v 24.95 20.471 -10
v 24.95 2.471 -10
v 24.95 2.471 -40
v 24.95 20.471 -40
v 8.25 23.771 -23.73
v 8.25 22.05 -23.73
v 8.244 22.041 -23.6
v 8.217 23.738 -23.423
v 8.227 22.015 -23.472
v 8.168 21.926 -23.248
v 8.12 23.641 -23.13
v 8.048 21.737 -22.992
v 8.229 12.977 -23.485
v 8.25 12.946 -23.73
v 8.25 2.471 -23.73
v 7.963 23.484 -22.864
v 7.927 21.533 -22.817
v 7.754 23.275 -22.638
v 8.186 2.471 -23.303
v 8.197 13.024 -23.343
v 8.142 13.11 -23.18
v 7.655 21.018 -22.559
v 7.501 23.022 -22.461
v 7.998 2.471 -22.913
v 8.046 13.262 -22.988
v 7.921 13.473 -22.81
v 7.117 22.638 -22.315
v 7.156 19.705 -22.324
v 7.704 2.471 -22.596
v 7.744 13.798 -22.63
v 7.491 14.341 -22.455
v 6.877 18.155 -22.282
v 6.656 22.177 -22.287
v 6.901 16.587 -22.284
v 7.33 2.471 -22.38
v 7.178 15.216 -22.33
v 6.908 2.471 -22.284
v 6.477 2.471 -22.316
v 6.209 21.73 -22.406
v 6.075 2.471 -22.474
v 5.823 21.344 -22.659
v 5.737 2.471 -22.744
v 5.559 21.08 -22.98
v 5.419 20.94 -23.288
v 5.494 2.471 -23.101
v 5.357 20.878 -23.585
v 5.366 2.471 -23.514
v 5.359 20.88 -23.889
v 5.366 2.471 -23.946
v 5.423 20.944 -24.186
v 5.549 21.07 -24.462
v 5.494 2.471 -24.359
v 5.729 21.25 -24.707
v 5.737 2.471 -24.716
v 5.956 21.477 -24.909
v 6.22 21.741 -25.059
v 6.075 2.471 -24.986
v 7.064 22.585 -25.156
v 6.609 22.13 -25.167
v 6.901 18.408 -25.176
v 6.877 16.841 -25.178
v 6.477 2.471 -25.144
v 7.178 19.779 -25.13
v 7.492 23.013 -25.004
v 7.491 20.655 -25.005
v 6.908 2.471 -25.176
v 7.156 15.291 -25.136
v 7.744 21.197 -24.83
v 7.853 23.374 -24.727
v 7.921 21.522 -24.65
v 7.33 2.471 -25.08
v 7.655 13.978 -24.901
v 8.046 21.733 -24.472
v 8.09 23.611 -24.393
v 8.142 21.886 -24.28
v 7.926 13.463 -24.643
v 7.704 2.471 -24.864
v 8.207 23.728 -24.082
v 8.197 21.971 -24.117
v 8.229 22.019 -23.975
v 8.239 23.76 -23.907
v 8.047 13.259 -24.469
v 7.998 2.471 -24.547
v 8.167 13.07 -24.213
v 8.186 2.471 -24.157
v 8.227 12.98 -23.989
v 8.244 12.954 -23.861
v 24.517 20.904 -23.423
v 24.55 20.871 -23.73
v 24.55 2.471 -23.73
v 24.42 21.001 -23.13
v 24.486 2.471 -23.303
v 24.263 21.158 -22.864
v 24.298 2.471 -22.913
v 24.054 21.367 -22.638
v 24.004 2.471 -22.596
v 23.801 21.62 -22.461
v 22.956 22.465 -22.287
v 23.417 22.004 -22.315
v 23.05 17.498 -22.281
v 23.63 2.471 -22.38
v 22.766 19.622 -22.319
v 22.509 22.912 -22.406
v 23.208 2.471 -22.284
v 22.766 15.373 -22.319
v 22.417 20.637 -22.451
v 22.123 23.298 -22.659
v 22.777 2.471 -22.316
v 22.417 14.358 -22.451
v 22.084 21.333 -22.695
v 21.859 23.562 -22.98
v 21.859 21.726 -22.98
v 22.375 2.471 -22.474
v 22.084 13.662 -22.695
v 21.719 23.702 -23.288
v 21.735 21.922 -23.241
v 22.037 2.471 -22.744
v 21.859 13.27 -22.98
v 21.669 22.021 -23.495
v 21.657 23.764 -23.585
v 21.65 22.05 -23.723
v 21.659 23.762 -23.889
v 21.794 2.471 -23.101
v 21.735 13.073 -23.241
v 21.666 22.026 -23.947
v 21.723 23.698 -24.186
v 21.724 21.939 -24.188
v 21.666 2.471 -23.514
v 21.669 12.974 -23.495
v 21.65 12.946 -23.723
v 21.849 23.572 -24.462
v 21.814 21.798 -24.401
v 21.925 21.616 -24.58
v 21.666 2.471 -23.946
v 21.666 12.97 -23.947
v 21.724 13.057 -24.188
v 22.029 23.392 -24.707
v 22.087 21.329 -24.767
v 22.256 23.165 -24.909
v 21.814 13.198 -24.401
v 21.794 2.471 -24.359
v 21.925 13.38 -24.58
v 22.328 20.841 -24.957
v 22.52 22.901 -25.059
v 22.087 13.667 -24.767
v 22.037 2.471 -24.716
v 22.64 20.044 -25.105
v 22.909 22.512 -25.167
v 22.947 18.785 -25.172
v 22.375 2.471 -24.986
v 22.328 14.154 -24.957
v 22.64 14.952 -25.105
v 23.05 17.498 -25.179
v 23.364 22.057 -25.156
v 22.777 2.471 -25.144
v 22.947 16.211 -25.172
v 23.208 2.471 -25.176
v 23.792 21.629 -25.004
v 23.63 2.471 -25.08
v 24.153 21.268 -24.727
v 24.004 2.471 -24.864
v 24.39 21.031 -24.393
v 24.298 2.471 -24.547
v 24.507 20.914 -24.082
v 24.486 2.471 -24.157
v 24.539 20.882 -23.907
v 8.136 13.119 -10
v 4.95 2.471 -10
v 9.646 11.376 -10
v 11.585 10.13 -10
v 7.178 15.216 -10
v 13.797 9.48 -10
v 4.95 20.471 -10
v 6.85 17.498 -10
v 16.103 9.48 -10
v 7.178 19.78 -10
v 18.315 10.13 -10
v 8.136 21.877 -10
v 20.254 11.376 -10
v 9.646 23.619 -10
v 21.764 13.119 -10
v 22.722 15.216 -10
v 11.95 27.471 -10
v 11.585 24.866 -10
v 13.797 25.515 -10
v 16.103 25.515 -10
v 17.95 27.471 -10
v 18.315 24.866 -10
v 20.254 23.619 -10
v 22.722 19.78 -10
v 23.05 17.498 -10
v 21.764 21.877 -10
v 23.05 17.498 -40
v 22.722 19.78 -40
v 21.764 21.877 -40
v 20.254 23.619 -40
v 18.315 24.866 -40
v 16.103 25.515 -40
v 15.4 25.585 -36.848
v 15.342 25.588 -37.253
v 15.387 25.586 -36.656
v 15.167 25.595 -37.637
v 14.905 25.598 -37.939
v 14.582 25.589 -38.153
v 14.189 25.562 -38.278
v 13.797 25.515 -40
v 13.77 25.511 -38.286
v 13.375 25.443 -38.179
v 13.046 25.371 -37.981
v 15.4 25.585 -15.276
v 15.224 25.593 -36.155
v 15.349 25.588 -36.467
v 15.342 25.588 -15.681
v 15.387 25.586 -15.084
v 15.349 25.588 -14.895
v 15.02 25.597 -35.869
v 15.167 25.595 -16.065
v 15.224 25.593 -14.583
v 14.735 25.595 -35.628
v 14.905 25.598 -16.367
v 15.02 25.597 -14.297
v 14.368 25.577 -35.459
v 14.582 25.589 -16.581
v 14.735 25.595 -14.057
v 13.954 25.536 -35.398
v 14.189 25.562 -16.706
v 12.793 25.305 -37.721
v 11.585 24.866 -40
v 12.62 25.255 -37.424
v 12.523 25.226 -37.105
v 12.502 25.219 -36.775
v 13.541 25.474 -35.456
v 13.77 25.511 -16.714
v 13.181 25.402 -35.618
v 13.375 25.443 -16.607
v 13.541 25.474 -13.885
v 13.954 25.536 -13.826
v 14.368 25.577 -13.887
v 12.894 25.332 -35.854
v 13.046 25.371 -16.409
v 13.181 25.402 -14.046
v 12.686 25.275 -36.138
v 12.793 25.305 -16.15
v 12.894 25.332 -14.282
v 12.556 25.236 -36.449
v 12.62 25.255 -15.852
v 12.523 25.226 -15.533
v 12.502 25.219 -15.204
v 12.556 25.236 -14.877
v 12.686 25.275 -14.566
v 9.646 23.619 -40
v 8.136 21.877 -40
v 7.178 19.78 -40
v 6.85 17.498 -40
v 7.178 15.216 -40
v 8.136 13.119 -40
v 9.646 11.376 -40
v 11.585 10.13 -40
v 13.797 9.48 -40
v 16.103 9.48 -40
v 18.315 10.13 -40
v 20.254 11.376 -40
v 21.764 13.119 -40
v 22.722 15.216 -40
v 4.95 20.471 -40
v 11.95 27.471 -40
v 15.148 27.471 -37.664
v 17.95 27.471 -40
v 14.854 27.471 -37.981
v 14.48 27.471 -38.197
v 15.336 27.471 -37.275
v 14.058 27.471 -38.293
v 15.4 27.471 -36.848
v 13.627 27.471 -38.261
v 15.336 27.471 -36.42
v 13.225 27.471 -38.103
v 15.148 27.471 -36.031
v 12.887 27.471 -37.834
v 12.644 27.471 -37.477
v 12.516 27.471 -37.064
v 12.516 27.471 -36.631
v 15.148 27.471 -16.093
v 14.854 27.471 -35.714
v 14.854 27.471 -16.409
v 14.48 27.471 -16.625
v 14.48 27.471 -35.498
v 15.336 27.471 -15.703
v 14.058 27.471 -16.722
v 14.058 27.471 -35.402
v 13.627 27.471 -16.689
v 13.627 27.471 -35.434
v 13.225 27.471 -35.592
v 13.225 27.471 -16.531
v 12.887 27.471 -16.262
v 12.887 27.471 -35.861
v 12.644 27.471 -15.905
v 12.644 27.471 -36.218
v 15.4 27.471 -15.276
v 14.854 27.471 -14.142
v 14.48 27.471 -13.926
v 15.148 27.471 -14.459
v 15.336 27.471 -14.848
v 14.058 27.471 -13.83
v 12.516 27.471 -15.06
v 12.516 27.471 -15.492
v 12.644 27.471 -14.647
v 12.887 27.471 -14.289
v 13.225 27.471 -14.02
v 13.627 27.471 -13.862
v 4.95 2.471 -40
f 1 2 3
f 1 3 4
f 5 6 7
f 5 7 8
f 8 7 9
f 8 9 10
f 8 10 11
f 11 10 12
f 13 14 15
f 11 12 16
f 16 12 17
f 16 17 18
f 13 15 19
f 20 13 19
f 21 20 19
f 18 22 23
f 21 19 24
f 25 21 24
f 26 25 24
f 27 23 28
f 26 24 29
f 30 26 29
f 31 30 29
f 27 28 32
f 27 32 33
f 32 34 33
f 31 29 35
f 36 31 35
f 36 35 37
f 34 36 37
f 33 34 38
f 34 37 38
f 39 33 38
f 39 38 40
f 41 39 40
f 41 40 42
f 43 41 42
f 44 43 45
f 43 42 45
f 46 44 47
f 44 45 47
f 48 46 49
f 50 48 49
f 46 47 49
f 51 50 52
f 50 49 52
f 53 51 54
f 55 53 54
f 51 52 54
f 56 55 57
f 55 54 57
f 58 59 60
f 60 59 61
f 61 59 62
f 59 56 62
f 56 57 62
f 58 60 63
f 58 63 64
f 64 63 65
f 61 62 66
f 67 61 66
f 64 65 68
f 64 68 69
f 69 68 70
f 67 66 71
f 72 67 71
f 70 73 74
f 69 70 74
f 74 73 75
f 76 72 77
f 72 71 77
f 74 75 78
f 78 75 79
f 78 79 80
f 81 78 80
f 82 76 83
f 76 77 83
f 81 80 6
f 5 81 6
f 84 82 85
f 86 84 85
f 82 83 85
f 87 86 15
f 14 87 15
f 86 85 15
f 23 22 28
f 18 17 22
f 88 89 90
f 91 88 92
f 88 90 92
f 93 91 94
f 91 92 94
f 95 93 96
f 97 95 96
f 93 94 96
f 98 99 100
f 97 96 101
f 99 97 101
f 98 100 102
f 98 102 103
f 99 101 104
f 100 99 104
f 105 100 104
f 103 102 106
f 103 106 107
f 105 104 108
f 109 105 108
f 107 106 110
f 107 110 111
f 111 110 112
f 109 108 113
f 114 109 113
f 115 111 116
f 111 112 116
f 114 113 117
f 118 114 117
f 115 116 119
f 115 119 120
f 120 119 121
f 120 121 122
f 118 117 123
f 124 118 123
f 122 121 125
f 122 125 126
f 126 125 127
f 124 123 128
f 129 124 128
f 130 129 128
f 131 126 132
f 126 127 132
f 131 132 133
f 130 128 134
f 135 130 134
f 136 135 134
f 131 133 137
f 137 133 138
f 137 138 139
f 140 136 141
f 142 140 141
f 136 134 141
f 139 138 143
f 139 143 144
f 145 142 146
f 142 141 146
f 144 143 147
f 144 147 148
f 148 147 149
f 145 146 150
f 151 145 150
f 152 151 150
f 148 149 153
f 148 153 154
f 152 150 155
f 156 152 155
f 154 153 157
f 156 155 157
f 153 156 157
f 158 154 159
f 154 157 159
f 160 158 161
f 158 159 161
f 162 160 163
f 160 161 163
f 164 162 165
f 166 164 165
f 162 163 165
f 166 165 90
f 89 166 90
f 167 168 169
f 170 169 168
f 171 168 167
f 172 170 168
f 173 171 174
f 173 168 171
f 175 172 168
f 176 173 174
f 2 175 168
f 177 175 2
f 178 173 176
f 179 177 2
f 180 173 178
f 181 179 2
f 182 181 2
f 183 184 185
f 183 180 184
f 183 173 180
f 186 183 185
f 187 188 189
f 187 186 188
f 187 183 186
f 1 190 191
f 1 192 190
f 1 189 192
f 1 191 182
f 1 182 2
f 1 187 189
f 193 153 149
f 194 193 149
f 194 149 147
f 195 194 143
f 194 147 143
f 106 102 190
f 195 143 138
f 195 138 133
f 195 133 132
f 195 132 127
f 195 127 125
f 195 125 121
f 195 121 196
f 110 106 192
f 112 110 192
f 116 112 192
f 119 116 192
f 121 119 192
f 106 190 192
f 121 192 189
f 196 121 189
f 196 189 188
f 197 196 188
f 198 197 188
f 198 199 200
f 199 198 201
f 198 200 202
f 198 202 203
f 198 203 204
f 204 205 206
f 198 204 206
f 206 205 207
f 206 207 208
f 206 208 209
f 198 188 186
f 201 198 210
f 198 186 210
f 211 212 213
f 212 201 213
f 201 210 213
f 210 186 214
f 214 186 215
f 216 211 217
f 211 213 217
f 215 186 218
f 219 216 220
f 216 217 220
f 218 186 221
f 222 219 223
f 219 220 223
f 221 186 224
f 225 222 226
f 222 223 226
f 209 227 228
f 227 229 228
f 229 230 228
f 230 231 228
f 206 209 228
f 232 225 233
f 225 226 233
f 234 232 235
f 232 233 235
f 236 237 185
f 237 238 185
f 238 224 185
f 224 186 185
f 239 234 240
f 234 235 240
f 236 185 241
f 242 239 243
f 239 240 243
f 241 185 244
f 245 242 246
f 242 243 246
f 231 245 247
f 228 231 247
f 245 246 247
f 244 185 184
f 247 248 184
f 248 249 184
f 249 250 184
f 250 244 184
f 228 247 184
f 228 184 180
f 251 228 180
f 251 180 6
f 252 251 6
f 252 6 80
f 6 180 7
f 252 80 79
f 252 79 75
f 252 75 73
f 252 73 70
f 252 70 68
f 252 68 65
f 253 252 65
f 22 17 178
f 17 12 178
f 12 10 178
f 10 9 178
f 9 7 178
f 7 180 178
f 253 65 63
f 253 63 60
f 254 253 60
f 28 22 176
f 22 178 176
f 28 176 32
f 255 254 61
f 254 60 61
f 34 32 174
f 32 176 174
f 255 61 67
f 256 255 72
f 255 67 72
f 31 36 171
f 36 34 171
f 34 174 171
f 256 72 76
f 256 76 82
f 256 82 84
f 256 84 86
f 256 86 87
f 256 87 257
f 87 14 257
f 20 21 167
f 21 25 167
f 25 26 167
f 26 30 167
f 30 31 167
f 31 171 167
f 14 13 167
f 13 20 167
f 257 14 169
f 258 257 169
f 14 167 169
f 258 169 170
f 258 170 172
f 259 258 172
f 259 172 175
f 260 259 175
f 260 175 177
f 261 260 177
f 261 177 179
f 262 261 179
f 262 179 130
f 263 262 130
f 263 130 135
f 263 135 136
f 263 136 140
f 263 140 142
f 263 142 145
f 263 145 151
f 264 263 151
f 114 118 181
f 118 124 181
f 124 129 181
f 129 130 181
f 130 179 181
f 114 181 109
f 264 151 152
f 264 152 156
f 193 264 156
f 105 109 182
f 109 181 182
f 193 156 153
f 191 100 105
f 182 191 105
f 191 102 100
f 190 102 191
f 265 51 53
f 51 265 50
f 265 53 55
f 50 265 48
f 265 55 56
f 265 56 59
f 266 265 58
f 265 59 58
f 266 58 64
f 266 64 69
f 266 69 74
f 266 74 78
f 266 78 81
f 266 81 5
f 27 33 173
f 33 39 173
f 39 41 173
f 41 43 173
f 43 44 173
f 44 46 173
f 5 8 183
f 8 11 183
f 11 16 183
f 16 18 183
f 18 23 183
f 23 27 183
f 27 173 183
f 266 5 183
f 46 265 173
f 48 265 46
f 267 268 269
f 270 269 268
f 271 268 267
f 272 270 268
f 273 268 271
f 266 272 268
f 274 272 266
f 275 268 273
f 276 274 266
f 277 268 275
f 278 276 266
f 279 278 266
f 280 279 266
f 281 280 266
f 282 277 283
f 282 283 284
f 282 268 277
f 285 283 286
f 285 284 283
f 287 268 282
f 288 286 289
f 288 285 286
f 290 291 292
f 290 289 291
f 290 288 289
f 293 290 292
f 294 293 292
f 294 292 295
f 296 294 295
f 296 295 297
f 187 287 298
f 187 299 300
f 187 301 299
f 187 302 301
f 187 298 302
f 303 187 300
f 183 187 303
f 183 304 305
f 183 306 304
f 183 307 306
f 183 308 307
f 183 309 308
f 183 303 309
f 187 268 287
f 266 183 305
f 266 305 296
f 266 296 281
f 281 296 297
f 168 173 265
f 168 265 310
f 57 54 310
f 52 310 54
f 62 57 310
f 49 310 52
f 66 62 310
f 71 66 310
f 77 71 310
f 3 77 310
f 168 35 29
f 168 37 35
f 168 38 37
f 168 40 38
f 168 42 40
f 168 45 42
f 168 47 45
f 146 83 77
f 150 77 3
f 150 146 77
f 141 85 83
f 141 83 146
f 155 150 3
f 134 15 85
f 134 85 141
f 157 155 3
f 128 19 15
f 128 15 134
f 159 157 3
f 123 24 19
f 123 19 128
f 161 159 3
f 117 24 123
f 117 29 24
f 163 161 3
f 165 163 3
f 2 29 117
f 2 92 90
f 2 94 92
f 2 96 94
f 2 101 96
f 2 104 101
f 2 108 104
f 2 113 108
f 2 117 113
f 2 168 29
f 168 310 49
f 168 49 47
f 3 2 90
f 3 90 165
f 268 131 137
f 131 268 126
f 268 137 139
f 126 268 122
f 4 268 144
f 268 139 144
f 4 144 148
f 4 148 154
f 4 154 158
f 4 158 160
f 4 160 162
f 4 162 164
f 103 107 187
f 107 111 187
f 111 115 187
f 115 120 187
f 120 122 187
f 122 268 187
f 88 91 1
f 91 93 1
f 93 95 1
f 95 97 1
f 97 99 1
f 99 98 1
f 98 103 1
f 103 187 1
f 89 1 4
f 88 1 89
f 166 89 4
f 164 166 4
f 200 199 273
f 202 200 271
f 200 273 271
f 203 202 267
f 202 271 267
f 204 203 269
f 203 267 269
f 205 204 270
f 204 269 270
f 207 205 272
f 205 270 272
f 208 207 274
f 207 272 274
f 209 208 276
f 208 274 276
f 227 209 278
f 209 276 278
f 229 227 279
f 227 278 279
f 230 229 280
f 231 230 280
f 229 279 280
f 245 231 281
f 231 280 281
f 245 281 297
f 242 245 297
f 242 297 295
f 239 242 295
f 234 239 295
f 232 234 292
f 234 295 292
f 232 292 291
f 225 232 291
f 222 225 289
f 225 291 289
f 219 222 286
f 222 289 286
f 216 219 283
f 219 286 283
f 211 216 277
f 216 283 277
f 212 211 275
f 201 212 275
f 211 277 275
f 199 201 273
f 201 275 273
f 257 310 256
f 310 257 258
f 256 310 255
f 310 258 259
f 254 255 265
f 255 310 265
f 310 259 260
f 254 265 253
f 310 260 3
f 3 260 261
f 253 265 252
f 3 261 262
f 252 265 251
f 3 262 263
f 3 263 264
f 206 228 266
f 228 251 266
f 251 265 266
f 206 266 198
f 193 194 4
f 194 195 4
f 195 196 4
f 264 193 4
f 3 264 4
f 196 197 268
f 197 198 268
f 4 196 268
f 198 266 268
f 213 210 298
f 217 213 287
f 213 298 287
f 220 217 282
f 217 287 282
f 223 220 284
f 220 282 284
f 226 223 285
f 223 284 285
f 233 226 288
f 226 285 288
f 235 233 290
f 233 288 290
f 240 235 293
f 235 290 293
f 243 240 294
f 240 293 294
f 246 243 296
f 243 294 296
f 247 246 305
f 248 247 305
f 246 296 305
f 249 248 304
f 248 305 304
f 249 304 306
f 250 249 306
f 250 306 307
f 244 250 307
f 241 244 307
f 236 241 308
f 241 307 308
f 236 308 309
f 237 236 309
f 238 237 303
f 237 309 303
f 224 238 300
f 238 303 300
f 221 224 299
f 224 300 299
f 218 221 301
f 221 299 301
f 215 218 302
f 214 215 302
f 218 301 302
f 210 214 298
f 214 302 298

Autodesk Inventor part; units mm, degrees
ref_plane "YZ Plane" through (0, 0, 0) normal (1, 0, 0) x (0, 1, 0)
ref_plane "XZ Plane" through (0, 0, 0) normal (0, 1, 0) x (-1, 0, 0)
ref_plane "XY Plane" through (0, 0, 0) normal (0, 0, 1) x (1, 0, 0)
ref_plane "Work Plane1" through (0, 0, 0) normal (0, 0, 1) x (1, 0, 0)
ref_plane "Work Plane2" through (0, 0, -10) normal (0, 0, 1) x (1, 0, 0)
sketch "Sketch1" plane through (0, 0, -10) normal (0, 0, 1) x (1, 0, 0)
  circle A0 centre (14.95, 17.4977) radius 7.15 projected
  line L0 (0, 2.471) -> (29.9, 2.471) projected
  line L1 (0, 2.471) -> (0, 18.471) projected
  line L2 (0, 18.471) -> (-2, 18.471) projected
  line L3 (-2, 18.471) -> (-2, -1.5) projected
  line L4 (29.9, -1.5) -> (-2, -1.5) projected
  line L5 (29.9, -1.5) -> (29.9, 2.471) projected
  line L6 (4.95, 2.471) -> (24.95, 2.471)
  line L7 (24.95, 2.471) -> (24.95, 27.471)
  line L8 (24.95, 27.471) -> (4.95, 27.471)
  line L9 (4.95, 27.471) -> (4.95, 2.471)
  circle A1 centre (14.95, 17.4977) radius 8.1
  point P0 (0, 0)
  dimension "d6" = 20
  dimension "d7" = 25
  dimension "d8" = 10
  dimension "d23" = 16.2
extrude "Extrusion1" add sketch "Sketch1" against normal blind 30 contours L9 L8 L7 L0
sketch "Sketch2" plane through (4.95, 2.471, -10) normal (0, -1, 0) x (1, 0, 0)
  circle A0 centre (18.15, -13.73) radius 2.45 projected
  circle A1 centre (1.85, -13.73) radius 2.75 projected
  circle A2 centre (18.15, -13.73) radius 1.45
  circle A3 centre (1.85, -13.73) radius 1.45
  point P0 (-4.95, 10)
  dimension "d10" = 2.9
  dimension "d11" = 2.9
extrude "Extrusion2" cut sketch "Sketch2" against normal through all contours A2 | A3
chamfer "Chamfer1" distance 7 angle 45 2 edges at (24.95, 27.471, -25) (4.95, 27.471, -25)
sketch "Sketch3" plane through (11.95, 27.471, -10) normal (0, 1, 0) x (1, 0, 0)
  line L0 (0, 0) -> (0, 30) projected
  line L1 (6, 0) -> (0, 0) projected
  line L2 (6, 30) -> (6, 0) projected
  line L3 (0, 30) -> (6, 30) projected
  circle A0 centre (2, 5.2757) radius 1.45
  circle A1 centre (2, 26.8475) radius 1.45
  point P0 (-11.95, -10)
  dimension "d17" = 2.9
  dimension "d18" = 2.9
extrude "Extrusion3" cut sketch "Sketch3" against normal blind 10 contours A0 | A1
ref_plane "Work Plane3" through (0, 27.471, -10) normal (0, -0.7071068, 0.7071068) x (1, 0, 0)
ref_plane "Work Plane4" through (11.95, 27.471, -10) normal (0, 0.7071068, 0.7071068) x (1, 0, 0)
ref_plane "Work Plane5" through (14.95, 2.471, -10) normal (1, 0, 0) x (0, 0, -1)
sketch "Sketch5" plane through (14.95, 2.471, -10) normal (1, 0, 0) x (0, 0, -1)
  line L0 (0, 23.1268) -> (30, 23.1268) projected
  line L1 (0, 6.9268) -> (30, 6.9268) projected
  line L2 (0, 23.1268) -> (-4.2183, 23.1268)
  line L3 (-4.2183, 23.1268) -> (24.7731, 52.1181)
  line L4 (24.7731, 52.1181) -> (24.7731, 23.1268)
  point P0 (-10, -2.471)
  dimension "d21" = 41
  dimension "d22" = 45
properties part number "cellSTORM_v5_bluelaser_adapter"
